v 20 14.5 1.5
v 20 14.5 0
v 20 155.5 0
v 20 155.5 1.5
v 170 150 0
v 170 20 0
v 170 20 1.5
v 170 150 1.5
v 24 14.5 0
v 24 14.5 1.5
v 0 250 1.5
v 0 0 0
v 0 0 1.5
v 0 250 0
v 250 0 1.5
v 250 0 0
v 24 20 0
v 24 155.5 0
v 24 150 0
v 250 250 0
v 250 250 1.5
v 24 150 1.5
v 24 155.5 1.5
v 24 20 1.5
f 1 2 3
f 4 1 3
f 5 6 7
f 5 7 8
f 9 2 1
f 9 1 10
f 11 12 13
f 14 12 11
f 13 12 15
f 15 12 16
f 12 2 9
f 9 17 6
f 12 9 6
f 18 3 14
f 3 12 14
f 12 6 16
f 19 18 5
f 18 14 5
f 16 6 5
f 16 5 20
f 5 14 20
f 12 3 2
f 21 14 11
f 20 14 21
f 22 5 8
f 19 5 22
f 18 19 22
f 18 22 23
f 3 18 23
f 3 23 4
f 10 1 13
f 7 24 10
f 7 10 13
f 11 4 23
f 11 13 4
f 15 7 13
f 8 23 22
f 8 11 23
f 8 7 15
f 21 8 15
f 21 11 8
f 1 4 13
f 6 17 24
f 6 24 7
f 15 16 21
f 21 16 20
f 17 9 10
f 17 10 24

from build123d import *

# Parameters (mm, degrees)
ESQUISSE1_W        = 250
ESQUISSE1_H        = 250
BOSS_EXTRU_1_DEPTH = 1.5


with BuildPart() as part:
    # Esquisse1 → Boss.-Extru.1 (new body)
    with BuildSketch(Plane.XY):
        with Locations((125, 125)):
            Rectangle(ESQUISSE1_W, ESQUISSE1_H)
        Polygon((24, 20), (170, 20), (170, 150), (24, 150), (24, 155.5), (20, 155.5), (20, 150), (20, 20), (20, 14.5), (24, 14.5), align=None, mode=Mode.SUBTRACT)
    extrude(amount=BOSS_EXTRU_1_DEPTH)


solid = part.part
